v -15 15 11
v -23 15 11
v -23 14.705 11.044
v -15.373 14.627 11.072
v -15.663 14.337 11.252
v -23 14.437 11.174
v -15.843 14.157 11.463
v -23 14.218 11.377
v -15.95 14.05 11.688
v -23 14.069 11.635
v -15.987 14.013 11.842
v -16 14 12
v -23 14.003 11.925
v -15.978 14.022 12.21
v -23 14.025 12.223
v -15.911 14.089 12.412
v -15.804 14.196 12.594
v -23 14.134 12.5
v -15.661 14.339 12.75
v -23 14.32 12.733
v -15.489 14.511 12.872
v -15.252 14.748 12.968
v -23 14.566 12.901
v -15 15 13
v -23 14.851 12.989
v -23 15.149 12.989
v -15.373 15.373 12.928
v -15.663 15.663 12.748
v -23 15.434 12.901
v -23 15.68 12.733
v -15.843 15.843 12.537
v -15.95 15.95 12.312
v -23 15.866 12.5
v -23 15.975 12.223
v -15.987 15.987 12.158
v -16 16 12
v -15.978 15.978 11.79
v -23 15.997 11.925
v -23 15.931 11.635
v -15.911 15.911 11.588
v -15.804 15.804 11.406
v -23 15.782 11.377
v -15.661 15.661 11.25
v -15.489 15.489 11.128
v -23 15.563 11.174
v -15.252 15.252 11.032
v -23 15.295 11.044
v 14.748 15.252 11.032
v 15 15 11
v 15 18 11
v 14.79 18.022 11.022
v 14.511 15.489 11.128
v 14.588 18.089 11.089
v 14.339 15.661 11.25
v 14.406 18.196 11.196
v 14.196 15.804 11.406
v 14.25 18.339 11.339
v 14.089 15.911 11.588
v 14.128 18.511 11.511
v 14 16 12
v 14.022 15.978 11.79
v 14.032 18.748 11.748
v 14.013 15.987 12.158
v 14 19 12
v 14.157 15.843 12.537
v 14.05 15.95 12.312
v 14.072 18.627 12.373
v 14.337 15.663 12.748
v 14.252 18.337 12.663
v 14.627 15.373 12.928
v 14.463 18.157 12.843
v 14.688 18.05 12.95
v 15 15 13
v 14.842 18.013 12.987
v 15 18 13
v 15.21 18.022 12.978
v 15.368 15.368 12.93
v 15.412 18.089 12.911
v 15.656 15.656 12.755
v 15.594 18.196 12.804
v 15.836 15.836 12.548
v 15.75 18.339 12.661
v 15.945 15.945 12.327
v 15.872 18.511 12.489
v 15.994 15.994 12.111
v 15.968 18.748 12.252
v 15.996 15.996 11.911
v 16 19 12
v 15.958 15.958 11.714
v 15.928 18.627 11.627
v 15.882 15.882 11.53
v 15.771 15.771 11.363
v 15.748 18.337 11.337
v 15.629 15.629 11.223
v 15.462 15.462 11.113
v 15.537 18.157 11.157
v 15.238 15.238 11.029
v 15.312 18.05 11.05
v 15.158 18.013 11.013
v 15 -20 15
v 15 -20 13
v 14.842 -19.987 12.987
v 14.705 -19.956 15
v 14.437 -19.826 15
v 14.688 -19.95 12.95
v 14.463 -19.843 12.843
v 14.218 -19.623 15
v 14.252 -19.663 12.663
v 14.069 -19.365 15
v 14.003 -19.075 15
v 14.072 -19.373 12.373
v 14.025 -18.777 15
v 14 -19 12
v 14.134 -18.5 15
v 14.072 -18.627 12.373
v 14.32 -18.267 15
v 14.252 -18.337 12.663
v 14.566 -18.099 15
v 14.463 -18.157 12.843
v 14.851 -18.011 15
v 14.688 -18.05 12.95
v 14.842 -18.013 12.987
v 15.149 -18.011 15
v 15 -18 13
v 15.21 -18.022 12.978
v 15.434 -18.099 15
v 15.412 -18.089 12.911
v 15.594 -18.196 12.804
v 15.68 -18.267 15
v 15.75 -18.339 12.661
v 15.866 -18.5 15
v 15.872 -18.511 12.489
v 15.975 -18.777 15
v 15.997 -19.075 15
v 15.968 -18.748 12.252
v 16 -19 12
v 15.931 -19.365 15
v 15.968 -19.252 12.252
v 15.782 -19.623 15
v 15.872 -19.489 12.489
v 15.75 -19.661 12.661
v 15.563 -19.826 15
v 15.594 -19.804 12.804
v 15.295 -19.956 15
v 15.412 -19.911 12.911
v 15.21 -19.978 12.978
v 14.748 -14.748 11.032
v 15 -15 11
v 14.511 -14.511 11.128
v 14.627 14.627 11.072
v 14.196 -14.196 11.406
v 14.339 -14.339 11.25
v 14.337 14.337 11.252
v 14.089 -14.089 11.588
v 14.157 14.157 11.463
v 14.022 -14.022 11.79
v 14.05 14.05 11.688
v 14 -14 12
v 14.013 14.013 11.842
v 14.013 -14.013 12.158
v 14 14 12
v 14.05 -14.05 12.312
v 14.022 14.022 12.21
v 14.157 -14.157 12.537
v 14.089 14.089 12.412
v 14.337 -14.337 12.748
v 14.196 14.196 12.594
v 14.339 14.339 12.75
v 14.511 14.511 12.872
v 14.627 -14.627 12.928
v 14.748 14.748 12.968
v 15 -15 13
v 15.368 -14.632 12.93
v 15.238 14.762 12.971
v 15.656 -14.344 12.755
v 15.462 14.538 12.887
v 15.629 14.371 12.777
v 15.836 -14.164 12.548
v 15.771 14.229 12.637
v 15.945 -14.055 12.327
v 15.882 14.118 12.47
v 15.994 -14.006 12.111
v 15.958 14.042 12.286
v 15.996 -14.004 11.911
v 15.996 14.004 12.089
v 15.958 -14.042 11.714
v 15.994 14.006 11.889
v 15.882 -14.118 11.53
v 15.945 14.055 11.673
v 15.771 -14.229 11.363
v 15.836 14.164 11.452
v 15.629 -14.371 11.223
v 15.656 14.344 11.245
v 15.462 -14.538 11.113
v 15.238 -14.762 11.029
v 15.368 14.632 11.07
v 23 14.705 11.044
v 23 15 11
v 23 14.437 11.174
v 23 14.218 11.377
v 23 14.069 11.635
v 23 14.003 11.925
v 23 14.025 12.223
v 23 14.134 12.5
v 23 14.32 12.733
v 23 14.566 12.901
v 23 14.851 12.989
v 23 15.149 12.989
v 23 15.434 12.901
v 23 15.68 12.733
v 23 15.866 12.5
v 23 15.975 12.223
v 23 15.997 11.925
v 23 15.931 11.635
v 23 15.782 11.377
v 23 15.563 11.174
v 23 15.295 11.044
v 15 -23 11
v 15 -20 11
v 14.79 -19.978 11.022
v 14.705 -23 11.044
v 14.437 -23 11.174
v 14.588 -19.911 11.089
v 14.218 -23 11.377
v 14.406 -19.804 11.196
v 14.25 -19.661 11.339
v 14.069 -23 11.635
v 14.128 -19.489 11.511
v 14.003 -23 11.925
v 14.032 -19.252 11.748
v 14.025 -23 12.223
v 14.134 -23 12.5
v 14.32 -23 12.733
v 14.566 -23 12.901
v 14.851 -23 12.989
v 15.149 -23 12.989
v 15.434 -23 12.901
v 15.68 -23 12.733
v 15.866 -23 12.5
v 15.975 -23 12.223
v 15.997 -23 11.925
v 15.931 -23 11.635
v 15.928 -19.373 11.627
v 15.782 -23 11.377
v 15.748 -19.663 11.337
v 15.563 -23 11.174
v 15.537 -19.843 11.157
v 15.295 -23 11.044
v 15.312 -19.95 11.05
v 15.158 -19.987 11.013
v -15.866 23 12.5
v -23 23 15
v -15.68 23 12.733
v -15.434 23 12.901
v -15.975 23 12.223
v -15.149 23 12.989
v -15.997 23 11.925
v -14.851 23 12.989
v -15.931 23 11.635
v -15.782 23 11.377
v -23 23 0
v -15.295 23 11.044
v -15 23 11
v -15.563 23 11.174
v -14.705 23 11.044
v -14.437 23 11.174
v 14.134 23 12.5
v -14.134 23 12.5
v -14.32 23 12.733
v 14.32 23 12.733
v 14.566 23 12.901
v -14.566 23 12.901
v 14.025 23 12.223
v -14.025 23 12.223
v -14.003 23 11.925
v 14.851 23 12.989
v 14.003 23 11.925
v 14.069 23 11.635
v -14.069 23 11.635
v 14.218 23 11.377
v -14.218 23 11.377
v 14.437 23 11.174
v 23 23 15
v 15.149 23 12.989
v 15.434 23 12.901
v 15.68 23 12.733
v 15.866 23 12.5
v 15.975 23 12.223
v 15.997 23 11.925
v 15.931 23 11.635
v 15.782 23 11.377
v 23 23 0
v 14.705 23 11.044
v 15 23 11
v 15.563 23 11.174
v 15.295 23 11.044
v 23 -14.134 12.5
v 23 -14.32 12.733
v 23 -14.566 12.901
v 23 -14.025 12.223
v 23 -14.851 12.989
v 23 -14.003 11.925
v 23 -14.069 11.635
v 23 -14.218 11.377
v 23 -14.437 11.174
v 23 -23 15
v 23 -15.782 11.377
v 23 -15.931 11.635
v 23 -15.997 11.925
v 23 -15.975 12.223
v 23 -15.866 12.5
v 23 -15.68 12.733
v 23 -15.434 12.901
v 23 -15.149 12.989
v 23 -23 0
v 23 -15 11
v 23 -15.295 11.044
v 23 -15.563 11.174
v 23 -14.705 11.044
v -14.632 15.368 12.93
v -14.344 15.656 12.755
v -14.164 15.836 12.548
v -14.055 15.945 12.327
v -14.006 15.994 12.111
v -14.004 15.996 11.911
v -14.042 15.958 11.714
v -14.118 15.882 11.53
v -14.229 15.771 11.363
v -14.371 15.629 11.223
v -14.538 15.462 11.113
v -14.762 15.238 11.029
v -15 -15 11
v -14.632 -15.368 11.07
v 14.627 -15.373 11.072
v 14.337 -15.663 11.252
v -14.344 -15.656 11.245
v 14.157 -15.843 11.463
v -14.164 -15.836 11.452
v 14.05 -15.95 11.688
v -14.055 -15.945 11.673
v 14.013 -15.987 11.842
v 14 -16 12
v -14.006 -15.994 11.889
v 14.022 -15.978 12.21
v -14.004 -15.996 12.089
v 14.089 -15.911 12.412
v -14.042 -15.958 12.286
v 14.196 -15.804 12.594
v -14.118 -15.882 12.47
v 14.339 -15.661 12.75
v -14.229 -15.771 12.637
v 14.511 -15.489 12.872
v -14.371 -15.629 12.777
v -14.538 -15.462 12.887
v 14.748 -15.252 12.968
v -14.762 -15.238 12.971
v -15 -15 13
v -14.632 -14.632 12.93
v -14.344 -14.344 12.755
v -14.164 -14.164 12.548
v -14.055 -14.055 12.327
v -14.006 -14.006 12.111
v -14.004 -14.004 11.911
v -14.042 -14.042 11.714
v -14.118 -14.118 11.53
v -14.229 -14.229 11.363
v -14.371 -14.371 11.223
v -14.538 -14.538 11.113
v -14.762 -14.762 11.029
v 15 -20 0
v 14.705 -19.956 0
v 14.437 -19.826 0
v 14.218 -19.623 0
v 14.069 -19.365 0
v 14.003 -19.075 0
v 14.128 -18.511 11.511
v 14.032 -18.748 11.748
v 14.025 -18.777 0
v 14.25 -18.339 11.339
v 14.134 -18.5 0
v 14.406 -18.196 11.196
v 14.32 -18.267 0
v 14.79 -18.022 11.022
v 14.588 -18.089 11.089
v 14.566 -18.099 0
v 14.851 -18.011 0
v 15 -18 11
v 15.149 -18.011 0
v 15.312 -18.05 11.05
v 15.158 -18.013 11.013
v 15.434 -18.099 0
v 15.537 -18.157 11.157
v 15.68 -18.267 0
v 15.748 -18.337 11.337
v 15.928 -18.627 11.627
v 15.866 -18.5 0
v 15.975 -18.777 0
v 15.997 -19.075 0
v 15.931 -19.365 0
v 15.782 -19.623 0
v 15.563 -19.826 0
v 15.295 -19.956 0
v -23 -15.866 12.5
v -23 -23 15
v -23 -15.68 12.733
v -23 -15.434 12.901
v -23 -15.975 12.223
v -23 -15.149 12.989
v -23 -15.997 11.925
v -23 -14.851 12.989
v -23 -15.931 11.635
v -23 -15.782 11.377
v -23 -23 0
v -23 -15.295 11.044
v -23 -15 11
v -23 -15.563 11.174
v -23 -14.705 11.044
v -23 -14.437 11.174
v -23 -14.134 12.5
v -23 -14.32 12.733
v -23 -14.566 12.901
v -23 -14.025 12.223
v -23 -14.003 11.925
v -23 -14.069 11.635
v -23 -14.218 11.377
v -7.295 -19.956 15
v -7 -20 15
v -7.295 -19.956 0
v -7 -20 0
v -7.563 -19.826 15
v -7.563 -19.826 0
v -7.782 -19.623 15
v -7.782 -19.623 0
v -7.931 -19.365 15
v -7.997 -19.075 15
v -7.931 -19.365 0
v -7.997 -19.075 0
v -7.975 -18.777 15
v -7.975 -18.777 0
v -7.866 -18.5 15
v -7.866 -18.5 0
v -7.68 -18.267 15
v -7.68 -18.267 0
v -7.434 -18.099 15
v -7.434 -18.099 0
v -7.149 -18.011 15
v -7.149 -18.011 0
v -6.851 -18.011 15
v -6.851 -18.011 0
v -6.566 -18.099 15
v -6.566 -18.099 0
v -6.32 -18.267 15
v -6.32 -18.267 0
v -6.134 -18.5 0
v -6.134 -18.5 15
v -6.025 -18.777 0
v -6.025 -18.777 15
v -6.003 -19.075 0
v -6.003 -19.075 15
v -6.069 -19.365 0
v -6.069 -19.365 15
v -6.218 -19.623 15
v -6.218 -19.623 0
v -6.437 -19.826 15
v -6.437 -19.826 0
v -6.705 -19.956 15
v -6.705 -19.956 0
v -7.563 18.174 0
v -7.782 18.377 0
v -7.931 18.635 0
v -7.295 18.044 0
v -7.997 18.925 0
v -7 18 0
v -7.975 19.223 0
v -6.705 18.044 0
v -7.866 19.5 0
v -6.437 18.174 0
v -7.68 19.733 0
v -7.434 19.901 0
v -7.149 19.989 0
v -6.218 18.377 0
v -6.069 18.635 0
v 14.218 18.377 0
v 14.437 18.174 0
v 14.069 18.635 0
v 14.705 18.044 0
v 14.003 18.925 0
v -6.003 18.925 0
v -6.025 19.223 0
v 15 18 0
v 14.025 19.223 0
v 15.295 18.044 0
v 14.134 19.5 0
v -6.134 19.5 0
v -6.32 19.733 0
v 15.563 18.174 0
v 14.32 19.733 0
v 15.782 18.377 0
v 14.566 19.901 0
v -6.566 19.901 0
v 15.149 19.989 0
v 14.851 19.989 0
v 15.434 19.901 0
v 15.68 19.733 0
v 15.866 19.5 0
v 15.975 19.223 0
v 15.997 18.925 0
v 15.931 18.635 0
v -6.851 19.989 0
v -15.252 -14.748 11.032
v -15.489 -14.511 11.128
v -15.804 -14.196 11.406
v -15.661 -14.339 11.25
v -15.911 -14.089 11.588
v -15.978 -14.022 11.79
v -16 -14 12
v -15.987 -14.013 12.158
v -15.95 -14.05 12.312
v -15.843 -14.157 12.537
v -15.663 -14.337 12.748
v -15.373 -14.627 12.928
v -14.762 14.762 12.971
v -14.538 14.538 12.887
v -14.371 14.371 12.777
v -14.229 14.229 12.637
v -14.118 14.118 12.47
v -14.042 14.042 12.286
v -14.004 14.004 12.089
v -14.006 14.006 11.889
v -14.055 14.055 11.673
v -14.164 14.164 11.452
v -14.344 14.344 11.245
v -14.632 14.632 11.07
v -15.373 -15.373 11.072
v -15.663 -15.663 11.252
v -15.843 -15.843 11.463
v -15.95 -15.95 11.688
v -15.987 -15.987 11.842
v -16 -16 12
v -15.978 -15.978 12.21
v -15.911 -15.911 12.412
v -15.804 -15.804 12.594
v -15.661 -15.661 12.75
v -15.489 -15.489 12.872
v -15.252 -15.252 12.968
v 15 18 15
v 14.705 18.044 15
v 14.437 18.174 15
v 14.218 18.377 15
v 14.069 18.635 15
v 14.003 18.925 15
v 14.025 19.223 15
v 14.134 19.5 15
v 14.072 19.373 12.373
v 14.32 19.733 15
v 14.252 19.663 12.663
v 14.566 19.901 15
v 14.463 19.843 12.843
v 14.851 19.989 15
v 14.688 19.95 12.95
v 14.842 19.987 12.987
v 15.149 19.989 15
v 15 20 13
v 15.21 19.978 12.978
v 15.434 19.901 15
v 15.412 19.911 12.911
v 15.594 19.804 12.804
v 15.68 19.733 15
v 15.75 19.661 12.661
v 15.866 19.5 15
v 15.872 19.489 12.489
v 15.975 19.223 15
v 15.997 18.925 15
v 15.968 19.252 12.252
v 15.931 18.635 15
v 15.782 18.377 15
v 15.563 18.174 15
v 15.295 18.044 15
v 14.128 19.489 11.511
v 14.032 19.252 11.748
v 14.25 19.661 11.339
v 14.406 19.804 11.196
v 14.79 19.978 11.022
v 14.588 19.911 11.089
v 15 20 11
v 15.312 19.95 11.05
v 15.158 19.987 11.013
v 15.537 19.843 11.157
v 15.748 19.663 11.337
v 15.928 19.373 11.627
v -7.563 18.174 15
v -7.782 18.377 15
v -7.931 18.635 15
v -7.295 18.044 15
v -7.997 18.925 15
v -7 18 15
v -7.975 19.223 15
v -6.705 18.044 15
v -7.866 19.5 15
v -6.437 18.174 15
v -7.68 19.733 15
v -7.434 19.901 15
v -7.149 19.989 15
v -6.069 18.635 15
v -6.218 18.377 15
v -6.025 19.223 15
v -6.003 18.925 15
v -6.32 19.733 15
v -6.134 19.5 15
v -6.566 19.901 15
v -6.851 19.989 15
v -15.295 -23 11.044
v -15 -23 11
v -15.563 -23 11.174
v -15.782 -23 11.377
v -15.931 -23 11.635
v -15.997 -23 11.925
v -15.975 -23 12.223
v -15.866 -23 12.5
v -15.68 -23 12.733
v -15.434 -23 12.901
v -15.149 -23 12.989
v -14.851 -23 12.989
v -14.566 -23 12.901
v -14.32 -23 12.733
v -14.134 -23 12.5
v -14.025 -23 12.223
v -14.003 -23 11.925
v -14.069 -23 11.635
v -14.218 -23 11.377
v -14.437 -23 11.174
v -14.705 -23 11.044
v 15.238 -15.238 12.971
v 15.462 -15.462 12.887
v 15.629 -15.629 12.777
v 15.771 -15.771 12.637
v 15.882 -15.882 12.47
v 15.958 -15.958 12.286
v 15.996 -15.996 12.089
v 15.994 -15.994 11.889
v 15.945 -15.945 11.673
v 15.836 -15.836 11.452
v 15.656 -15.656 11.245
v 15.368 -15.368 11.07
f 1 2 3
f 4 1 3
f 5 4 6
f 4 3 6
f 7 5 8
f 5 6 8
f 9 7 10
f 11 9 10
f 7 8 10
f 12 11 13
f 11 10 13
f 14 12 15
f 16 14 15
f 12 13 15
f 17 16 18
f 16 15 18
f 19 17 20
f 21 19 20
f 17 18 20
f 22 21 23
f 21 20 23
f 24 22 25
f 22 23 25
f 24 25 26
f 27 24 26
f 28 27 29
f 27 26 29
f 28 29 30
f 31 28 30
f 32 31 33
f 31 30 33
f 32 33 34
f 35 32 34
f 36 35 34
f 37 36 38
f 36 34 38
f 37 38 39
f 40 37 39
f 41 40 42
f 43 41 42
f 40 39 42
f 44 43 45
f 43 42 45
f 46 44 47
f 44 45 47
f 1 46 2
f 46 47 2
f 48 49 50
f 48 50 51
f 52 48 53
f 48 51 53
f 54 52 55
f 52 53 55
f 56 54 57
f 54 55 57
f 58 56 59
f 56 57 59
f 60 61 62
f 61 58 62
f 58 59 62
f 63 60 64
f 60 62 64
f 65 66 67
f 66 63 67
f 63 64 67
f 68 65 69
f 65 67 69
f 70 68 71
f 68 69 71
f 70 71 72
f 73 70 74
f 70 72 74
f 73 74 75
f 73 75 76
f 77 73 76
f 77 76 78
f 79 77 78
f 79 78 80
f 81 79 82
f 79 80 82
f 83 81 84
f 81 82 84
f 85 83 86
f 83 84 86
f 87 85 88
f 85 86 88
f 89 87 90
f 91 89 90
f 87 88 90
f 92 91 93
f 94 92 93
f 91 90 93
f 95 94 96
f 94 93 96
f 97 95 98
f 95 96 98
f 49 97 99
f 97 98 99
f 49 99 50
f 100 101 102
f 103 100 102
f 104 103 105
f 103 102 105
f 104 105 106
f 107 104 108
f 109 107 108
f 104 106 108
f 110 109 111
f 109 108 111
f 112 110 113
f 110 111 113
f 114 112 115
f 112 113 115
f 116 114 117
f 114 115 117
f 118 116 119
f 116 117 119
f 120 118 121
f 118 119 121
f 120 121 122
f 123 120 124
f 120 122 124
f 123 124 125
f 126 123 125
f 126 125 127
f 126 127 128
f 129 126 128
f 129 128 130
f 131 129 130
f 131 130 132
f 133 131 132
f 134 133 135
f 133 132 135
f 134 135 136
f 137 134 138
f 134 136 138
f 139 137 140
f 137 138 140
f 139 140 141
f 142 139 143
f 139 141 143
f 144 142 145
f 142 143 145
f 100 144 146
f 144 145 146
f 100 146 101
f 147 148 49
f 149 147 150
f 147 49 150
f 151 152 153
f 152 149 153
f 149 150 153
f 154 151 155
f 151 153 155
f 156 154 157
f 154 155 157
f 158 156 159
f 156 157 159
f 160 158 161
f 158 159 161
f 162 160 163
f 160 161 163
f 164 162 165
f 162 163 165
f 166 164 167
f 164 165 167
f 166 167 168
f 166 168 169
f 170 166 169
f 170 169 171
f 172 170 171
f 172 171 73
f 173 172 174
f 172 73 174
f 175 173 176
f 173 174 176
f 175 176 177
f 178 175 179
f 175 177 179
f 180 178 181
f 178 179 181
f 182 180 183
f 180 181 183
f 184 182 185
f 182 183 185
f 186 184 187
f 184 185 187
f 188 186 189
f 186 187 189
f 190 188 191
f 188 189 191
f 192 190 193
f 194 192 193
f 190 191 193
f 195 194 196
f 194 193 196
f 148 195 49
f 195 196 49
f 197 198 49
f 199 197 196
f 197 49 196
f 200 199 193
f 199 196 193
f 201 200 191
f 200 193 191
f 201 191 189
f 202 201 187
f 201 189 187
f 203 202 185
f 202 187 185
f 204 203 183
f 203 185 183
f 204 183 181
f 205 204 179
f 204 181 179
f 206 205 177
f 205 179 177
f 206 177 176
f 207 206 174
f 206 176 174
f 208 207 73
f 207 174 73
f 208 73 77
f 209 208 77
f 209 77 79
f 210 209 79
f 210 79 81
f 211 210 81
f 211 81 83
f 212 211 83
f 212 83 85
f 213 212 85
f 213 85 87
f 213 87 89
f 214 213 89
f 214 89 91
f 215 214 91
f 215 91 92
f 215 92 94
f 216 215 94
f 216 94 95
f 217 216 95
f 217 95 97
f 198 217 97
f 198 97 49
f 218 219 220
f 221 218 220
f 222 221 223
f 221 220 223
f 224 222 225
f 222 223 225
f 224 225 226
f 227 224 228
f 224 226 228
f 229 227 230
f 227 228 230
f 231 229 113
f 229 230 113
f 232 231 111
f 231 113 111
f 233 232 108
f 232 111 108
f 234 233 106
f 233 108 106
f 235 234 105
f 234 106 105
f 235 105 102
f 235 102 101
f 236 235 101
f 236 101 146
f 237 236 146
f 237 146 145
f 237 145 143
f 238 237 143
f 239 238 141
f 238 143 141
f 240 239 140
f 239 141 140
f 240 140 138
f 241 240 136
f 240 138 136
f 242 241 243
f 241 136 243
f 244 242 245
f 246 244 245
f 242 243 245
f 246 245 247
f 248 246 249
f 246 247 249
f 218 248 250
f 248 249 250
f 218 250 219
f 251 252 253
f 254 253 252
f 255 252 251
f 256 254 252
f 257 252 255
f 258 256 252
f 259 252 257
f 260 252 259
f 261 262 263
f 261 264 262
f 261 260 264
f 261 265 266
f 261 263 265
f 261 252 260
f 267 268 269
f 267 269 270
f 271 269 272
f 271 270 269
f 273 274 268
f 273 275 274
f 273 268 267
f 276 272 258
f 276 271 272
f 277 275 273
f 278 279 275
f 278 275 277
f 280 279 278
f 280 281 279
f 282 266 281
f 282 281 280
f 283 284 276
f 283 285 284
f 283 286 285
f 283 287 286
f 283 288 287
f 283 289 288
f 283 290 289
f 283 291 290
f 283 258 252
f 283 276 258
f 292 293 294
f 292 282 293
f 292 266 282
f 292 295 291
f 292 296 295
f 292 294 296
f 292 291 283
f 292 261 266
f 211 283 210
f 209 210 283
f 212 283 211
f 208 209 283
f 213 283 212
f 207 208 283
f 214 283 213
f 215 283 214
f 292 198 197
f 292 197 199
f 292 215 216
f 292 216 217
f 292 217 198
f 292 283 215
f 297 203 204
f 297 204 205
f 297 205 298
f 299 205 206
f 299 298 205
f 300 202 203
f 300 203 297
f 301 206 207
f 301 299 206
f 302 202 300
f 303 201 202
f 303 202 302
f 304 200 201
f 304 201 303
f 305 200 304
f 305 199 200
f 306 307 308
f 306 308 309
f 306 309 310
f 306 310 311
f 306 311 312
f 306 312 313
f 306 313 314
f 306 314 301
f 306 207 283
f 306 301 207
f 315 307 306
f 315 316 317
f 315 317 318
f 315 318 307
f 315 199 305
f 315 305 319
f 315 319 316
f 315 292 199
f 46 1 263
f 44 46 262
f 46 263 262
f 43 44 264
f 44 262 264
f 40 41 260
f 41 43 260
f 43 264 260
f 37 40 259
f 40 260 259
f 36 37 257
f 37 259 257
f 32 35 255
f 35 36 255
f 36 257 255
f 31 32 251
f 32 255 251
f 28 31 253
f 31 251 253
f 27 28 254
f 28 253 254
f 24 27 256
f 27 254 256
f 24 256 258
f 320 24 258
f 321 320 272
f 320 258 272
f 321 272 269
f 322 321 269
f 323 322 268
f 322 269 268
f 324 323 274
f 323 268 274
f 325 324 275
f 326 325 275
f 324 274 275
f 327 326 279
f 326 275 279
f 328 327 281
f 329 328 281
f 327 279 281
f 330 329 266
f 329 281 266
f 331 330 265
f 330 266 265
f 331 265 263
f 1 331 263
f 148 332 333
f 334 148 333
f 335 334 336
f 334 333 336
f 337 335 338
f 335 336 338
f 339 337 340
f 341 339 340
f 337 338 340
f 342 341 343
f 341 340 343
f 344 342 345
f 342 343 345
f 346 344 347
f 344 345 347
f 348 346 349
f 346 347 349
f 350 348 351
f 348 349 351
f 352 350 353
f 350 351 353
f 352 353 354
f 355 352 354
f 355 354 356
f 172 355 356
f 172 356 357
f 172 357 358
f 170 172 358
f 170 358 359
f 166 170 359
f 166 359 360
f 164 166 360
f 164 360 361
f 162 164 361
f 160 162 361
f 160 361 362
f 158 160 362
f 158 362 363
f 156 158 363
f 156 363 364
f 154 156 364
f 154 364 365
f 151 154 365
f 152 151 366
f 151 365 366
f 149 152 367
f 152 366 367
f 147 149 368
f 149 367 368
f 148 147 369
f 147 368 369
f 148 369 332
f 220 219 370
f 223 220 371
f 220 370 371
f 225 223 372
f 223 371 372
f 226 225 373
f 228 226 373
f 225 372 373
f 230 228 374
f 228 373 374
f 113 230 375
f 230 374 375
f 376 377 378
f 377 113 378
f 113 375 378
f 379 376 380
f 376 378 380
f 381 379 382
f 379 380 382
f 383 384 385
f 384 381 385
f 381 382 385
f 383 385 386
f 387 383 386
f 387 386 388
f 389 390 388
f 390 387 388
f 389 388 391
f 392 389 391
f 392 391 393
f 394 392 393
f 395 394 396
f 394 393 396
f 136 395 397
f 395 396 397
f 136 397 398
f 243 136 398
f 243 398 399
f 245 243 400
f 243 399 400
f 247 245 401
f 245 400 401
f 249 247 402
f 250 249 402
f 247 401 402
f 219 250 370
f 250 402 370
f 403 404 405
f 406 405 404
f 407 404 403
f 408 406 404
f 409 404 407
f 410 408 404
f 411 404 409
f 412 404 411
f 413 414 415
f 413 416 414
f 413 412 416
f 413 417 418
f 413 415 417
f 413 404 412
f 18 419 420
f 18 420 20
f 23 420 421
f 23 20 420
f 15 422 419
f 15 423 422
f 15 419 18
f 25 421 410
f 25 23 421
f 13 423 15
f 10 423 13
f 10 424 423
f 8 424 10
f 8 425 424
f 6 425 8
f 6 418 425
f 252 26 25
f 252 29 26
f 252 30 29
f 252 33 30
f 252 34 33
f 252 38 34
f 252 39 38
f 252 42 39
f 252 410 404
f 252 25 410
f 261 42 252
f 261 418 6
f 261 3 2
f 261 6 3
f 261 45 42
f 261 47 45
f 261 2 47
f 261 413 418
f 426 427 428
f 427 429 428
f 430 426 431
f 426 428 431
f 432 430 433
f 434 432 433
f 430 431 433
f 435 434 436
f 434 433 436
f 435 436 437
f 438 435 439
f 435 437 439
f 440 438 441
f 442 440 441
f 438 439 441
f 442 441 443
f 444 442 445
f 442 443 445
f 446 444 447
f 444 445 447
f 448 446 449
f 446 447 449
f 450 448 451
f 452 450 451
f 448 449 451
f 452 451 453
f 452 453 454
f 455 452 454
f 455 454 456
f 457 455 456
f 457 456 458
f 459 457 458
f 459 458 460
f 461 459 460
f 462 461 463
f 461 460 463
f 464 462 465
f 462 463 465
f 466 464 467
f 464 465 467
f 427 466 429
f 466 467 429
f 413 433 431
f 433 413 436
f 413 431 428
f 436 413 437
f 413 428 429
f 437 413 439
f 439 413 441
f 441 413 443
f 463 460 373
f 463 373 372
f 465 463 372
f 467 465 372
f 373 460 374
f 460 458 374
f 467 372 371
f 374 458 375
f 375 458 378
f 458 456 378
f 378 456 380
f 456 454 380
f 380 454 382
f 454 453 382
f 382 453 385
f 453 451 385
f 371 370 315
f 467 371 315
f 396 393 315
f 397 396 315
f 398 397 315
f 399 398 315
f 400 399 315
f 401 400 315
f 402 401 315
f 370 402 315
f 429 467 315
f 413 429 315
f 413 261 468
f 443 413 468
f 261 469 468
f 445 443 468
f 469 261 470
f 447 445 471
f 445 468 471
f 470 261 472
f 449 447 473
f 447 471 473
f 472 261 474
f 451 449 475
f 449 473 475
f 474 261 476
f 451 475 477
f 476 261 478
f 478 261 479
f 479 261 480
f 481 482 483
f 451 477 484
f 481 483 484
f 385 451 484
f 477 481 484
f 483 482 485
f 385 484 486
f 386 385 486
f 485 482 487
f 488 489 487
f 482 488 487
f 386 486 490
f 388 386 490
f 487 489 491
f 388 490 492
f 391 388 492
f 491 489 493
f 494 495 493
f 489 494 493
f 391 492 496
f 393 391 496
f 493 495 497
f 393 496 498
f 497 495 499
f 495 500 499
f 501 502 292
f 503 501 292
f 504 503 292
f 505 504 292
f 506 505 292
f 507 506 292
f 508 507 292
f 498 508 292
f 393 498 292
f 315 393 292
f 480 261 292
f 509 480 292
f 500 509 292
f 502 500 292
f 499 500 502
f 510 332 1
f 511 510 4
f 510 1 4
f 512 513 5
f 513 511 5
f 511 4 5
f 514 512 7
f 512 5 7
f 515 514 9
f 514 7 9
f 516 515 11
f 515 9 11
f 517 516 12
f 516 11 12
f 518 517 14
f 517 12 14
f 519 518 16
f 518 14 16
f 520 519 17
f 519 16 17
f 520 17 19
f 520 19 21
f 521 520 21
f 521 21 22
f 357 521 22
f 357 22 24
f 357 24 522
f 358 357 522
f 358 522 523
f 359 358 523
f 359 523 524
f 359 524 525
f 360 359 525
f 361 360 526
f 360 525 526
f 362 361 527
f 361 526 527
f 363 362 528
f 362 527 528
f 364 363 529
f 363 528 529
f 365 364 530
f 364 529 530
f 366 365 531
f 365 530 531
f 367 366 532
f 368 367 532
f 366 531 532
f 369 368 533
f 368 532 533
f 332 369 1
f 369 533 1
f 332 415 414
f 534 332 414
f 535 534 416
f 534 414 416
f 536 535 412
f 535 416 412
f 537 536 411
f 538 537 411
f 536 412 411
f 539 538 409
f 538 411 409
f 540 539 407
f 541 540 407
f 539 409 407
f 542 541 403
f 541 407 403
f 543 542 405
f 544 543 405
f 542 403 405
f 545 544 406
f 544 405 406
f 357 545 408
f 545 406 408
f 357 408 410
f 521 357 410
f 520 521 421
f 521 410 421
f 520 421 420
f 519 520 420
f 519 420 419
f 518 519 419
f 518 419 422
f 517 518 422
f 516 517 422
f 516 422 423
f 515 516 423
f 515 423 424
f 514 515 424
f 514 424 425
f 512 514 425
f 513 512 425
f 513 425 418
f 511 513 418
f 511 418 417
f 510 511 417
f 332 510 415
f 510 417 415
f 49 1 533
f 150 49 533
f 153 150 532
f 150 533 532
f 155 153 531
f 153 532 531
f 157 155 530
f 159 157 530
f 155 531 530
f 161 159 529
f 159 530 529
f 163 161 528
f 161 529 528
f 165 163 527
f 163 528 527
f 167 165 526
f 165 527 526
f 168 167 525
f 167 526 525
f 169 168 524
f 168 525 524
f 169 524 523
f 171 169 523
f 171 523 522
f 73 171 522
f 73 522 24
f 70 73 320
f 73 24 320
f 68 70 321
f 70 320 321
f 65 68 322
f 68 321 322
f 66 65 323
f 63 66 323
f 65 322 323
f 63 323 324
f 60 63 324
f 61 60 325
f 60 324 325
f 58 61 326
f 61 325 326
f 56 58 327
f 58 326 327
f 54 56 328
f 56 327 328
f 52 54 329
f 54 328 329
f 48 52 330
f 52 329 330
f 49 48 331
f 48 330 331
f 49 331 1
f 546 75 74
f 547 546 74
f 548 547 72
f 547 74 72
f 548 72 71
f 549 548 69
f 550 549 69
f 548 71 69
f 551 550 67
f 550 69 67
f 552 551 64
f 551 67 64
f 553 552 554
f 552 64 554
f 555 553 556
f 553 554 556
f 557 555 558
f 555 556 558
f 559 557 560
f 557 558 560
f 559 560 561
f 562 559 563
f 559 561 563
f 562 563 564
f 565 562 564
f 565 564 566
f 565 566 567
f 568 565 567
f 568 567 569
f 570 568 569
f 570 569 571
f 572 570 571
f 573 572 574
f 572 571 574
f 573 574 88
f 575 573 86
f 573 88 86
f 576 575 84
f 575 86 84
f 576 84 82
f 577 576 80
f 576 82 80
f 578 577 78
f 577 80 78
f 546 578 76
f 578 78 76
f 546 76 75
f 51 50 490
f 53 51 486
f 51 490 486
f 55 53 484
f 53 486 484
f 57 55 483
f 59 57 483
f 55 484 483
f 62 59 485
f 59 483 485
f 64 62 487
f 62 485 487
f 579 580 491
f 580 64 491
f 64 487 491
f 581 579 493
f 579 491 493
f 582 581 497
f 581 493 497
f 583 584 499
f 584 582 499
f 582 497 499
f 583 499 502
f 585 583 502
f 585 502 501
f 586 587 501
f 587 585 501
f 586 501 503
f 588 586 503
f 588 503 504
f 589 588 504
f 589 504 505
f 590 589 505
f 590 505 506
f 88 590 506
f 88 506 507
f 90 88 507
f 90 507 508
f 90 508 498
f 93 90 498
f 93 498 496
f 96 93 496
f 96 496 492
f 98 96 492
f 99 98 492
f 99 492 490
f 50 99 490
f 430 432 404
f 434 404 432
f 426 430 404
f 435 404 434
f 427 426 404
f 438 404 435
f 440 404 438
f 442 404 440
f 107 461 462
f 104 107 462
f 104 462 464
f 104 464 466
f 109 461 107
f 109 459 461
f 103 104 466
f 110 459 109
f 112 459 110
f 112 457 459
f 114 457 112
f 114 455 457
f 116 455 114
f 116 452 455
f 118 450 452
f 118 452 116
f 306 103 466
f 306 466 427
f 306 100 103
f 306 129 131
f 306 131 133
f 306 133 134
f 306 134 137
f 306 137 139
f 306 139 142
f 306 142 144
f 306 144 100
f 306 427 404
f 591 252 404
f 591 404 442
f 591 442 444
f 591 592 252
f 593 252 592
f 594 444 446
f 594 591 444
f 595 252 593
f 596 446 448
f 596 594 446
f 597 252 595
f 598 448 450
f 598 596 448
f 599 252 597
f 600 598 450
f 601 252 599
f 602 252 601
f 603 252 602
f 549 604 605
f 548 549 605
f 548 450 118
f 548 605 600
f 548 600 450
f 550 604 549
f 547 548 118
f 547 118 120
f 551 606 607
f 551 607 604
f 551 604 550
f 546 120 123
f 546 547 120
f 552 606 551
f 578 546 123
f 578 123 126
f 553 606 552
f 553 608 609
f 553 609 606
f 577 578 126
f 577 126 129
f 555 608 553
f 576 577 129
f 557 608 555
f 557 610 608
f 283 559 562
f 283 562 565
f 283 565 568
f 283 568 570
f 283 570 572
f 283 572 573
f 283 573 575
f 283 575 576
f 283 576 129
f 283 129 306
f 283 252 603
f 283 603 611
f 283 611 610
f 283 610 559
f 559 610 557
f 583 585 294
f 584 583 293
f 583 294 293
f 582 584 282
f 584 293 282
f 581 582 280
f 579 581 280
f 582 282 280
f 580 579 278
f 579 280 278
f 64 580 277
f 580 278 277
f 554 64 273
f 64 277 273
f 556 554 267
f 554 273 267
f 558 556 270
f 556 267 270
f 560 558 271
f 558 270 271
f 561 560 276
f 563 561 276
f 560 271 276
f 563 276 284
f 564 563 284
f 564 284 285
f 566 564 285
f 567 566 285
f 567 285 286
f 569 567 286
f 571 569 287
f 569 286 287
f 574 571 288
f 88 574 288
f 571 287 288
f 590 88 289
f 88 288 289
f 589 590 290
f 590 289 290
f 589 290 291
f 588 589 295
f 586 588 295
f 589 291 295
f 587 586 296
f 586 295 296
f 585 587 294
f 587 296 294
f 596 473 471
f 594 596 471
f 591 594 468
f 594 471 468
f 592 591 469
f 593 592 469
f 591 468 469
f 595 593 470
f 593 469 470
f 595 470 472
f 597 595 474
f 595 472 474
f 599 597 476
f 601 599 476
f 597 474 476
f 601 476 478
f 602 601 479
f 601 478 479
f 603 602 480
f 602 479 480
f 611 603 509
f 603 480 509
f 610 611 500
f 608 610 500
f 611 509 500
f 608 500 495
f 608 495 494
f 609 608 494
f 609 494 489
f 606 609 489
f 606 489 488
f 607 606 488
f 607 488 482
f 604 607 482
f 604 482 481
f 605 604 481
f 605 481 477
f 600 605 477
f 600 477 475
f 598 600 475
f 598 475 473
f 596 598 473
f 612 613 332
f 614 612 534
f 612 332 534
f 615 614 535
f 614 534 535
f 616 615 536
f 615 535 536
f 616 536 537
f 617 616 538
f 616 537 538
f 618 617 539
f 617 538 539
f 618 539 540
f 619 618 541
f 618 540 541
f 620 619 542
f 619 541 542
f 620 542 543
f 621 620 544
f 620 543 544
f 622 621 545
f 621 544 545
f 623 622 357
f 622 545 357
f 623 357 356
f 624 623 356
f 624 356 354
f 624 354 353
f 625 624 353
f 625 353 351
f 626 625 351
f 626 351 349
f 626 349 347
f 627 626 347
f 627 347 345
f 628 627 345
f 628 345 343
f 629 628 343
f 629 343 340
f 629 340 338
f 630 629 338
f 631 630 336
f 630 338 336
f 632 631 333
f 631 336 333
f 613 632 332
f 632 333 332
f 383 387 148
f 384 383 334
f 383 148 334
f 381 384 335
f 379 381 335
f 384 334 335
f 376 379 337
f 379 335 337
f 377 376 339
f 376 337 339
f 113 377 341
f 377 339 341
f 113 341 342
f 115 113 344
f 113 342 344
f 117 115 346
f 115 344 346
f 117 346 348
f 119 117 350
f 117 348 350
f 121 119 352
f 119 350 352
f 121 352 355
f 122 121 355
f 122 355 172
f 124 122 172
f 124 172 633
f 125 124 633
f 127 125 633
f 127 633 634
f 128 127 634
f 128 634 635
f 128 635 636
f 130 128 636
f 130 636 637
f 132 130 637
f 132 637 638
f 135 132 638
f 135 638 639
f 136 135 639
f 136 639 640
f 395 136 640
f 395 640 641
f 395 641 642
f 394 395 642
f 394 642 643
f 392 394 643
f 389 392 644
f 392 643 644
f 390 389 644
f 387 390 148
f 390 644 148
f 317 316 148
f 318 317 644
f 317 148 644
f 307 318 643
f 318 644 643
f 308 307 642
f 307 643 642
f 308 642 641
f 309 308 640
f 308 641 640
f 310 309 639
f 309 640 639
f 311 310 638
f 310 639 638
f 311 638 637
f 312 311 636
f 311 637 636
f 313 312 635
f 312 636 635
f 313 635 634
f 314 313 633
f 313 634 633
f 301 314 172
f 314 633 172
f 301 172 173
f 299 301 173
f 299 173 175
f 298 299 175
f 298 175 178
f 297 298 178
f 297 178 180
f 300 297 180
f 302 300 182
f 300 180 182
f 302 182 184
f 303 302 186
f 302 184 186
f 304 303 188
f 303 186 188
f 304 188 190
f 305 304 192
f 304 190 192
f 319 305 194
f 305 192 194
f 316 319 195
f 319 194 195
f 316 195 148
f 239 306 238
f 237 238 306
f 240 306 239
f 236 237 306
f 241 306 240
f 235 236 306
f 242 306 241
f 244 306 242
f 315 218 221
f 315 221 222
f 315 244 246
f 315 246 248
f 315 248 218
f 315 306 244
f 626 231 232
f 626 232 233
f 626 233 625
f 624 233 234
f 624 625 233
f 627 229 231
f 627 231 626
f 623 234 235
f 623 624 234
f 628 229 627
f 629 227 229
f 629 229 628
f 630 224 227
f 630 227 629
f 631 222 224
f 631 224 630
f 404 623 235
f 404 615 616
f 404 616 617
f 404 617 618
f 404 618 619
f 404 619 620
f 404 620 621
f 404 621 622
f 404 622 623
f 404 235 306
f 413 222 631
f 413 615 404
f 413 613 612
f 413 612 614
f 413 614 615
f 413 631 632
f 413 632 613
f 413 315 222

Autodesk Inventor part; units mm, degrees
ref_plane "YZ Plane" through (0, 0, 0) normal (1, 0, 0) x (0, 1, 0)
ref_plane "XZ Plane" through (0, 0, 0) normal (0, 1, 0) x (-1, 0, 0)
ref_plane "XY Plane" through (0, 0, 0) normal (0, 0, 1) x (1, 0, 0)
sketch "スケッチ1" plane through (0, 0, 0) normal (0, 0, 1) x (1, 0, 0)
  line L0 (-23, 23) -> (23, 23)
  line L1 (23, 23) -> (23, -23)
  line L2 (23, -23) -> (-23, -23)
  line L3 (-23, -23) -> (-23, 23)
  point P0 (0, 0)
  dimension "d0" = 46
  dimension "d1" = 46
  dimension "d2" = 23
  dimension "d3" = 23
extrude "押し出し1" add sketch "スケッチ1" along normal blind 15
sketch "スケッチ2" plane through (23, -23, 0) normal (1, 0, 0) x (0, 0, -1)
  line L0 (0, 0) -> (-15, 0) projected
  line L1 (0, 46) -> (-15, 46) projected
  circle A0 centre (-12, 38) radius 1
  circle A1 centre (-12, 8) radius 1
  line L2 (-15, 46) -> (-15, 0) projected
  point P0 (0, 23)
  dimension "d6" = 2
  dimension "d8" = 8
  dimension "d13" = 8
  dimension "d48" = 3
  dimension "d50" = 3
hole "穴1" at (23, -15, 12) at (23, 15, 12) direction (-1, 0, 0) diameter 2 end through all
sketch "スケッチ3" plane through (-23, -23, 0) normal (0, -1, 0) x (1, 0, 0)
  line L0 (46, 15) -> (0, 15) projected
  line L1 (0, 0) -> (0, 15) projected
  line L2 (46, 0) -> (46, 15) projected
  circle A0 centre (8, 12) radius 1
  circle A1 centre (38, 12) radius 1
  point P0 (23, 0)
  dimension "d22" = 2
  dimension "d23" = 3
  dimension "d25" = 3
  dimension "d26" = 8
  dimension "d27" = 8
hole "穴2" at (-15, -23, 12) at (15, -23, 12) direction (0, 1, 0) diameter 2 end through all
sketch "スケッチ4" plane through (0, 0, 15) normal (0, 0, 1) x (1, 0, 0)
  line L0 (-23, -23) -> (-23, 23) projected
  line L1 (23, -23) -> (-23, -23) projected
  circle A0 centre (-7, 19) radius 1
  circle A1 centre (15, 19) radius 1
  circle A2 centre (-7, -19) radius 1
  circle A3 centre (15, -19) radius 1
  dimension "d51" = 2
  dimension "d52" = 22
  dimension "d53" = 22
  dimension "d54" = 38
  dimension "d55" = 38
  dimension "d88" = 16
  dimension "d89" = 16
  dimension "d90" = 4
  dimension "d91" = 4
hole "穴3" at (-7, -19, 15) at (-7, 19, 15) at (15, -19, 15) at (15, 19, 15) direction (0, 0, -1) diameter 2 end through all
thread "ねじ1" size "M2x0.4" class "6H" standard "ANSI Metric M Profile" full length
thread "ねじ3" size "M2x0.4" class "6H" standard "ANSI Metric M Profile" full length
thread "ねじ5" size "M2x0.4" class "6H" standard "ANSI Metric M Profile" full length
thread "ねじ6" size "M2x0.4" class "6H" standard "ANSI Metric M Profile" full length
thread "ねじ11" size "M2x0.4" class "6H" standard "ANSI Metric M Profile" full length
thread "ねじ13" size "M2x0.4" class "6H" standard "ANSI Metric M Profile" full length
thread "ねじ14" size "M2x0.4" class "6H" standard "ANSI Metric M Profile" full length
thread "ねじ16" size "M2x0.4" class "6H" standard "ANSI Metric M Profile" full length
thread "ねじ17" size "M2x0.4" class "6H" standard "ANSI Metric M Profile" full length
thread "ねじ18" size "M2x0.4" class "6H" standard "ANSI Metric M Profile" full length
thread "ねじ19" size "M2x0.4" class "6H" standard "ANSI Metric M Profile" full length
thread "ねじ20" size "M2x0.4" class "6H" standard "ANSI Metric M Profile" full length
properties part number "14" material "アセタール樹脂、白"
